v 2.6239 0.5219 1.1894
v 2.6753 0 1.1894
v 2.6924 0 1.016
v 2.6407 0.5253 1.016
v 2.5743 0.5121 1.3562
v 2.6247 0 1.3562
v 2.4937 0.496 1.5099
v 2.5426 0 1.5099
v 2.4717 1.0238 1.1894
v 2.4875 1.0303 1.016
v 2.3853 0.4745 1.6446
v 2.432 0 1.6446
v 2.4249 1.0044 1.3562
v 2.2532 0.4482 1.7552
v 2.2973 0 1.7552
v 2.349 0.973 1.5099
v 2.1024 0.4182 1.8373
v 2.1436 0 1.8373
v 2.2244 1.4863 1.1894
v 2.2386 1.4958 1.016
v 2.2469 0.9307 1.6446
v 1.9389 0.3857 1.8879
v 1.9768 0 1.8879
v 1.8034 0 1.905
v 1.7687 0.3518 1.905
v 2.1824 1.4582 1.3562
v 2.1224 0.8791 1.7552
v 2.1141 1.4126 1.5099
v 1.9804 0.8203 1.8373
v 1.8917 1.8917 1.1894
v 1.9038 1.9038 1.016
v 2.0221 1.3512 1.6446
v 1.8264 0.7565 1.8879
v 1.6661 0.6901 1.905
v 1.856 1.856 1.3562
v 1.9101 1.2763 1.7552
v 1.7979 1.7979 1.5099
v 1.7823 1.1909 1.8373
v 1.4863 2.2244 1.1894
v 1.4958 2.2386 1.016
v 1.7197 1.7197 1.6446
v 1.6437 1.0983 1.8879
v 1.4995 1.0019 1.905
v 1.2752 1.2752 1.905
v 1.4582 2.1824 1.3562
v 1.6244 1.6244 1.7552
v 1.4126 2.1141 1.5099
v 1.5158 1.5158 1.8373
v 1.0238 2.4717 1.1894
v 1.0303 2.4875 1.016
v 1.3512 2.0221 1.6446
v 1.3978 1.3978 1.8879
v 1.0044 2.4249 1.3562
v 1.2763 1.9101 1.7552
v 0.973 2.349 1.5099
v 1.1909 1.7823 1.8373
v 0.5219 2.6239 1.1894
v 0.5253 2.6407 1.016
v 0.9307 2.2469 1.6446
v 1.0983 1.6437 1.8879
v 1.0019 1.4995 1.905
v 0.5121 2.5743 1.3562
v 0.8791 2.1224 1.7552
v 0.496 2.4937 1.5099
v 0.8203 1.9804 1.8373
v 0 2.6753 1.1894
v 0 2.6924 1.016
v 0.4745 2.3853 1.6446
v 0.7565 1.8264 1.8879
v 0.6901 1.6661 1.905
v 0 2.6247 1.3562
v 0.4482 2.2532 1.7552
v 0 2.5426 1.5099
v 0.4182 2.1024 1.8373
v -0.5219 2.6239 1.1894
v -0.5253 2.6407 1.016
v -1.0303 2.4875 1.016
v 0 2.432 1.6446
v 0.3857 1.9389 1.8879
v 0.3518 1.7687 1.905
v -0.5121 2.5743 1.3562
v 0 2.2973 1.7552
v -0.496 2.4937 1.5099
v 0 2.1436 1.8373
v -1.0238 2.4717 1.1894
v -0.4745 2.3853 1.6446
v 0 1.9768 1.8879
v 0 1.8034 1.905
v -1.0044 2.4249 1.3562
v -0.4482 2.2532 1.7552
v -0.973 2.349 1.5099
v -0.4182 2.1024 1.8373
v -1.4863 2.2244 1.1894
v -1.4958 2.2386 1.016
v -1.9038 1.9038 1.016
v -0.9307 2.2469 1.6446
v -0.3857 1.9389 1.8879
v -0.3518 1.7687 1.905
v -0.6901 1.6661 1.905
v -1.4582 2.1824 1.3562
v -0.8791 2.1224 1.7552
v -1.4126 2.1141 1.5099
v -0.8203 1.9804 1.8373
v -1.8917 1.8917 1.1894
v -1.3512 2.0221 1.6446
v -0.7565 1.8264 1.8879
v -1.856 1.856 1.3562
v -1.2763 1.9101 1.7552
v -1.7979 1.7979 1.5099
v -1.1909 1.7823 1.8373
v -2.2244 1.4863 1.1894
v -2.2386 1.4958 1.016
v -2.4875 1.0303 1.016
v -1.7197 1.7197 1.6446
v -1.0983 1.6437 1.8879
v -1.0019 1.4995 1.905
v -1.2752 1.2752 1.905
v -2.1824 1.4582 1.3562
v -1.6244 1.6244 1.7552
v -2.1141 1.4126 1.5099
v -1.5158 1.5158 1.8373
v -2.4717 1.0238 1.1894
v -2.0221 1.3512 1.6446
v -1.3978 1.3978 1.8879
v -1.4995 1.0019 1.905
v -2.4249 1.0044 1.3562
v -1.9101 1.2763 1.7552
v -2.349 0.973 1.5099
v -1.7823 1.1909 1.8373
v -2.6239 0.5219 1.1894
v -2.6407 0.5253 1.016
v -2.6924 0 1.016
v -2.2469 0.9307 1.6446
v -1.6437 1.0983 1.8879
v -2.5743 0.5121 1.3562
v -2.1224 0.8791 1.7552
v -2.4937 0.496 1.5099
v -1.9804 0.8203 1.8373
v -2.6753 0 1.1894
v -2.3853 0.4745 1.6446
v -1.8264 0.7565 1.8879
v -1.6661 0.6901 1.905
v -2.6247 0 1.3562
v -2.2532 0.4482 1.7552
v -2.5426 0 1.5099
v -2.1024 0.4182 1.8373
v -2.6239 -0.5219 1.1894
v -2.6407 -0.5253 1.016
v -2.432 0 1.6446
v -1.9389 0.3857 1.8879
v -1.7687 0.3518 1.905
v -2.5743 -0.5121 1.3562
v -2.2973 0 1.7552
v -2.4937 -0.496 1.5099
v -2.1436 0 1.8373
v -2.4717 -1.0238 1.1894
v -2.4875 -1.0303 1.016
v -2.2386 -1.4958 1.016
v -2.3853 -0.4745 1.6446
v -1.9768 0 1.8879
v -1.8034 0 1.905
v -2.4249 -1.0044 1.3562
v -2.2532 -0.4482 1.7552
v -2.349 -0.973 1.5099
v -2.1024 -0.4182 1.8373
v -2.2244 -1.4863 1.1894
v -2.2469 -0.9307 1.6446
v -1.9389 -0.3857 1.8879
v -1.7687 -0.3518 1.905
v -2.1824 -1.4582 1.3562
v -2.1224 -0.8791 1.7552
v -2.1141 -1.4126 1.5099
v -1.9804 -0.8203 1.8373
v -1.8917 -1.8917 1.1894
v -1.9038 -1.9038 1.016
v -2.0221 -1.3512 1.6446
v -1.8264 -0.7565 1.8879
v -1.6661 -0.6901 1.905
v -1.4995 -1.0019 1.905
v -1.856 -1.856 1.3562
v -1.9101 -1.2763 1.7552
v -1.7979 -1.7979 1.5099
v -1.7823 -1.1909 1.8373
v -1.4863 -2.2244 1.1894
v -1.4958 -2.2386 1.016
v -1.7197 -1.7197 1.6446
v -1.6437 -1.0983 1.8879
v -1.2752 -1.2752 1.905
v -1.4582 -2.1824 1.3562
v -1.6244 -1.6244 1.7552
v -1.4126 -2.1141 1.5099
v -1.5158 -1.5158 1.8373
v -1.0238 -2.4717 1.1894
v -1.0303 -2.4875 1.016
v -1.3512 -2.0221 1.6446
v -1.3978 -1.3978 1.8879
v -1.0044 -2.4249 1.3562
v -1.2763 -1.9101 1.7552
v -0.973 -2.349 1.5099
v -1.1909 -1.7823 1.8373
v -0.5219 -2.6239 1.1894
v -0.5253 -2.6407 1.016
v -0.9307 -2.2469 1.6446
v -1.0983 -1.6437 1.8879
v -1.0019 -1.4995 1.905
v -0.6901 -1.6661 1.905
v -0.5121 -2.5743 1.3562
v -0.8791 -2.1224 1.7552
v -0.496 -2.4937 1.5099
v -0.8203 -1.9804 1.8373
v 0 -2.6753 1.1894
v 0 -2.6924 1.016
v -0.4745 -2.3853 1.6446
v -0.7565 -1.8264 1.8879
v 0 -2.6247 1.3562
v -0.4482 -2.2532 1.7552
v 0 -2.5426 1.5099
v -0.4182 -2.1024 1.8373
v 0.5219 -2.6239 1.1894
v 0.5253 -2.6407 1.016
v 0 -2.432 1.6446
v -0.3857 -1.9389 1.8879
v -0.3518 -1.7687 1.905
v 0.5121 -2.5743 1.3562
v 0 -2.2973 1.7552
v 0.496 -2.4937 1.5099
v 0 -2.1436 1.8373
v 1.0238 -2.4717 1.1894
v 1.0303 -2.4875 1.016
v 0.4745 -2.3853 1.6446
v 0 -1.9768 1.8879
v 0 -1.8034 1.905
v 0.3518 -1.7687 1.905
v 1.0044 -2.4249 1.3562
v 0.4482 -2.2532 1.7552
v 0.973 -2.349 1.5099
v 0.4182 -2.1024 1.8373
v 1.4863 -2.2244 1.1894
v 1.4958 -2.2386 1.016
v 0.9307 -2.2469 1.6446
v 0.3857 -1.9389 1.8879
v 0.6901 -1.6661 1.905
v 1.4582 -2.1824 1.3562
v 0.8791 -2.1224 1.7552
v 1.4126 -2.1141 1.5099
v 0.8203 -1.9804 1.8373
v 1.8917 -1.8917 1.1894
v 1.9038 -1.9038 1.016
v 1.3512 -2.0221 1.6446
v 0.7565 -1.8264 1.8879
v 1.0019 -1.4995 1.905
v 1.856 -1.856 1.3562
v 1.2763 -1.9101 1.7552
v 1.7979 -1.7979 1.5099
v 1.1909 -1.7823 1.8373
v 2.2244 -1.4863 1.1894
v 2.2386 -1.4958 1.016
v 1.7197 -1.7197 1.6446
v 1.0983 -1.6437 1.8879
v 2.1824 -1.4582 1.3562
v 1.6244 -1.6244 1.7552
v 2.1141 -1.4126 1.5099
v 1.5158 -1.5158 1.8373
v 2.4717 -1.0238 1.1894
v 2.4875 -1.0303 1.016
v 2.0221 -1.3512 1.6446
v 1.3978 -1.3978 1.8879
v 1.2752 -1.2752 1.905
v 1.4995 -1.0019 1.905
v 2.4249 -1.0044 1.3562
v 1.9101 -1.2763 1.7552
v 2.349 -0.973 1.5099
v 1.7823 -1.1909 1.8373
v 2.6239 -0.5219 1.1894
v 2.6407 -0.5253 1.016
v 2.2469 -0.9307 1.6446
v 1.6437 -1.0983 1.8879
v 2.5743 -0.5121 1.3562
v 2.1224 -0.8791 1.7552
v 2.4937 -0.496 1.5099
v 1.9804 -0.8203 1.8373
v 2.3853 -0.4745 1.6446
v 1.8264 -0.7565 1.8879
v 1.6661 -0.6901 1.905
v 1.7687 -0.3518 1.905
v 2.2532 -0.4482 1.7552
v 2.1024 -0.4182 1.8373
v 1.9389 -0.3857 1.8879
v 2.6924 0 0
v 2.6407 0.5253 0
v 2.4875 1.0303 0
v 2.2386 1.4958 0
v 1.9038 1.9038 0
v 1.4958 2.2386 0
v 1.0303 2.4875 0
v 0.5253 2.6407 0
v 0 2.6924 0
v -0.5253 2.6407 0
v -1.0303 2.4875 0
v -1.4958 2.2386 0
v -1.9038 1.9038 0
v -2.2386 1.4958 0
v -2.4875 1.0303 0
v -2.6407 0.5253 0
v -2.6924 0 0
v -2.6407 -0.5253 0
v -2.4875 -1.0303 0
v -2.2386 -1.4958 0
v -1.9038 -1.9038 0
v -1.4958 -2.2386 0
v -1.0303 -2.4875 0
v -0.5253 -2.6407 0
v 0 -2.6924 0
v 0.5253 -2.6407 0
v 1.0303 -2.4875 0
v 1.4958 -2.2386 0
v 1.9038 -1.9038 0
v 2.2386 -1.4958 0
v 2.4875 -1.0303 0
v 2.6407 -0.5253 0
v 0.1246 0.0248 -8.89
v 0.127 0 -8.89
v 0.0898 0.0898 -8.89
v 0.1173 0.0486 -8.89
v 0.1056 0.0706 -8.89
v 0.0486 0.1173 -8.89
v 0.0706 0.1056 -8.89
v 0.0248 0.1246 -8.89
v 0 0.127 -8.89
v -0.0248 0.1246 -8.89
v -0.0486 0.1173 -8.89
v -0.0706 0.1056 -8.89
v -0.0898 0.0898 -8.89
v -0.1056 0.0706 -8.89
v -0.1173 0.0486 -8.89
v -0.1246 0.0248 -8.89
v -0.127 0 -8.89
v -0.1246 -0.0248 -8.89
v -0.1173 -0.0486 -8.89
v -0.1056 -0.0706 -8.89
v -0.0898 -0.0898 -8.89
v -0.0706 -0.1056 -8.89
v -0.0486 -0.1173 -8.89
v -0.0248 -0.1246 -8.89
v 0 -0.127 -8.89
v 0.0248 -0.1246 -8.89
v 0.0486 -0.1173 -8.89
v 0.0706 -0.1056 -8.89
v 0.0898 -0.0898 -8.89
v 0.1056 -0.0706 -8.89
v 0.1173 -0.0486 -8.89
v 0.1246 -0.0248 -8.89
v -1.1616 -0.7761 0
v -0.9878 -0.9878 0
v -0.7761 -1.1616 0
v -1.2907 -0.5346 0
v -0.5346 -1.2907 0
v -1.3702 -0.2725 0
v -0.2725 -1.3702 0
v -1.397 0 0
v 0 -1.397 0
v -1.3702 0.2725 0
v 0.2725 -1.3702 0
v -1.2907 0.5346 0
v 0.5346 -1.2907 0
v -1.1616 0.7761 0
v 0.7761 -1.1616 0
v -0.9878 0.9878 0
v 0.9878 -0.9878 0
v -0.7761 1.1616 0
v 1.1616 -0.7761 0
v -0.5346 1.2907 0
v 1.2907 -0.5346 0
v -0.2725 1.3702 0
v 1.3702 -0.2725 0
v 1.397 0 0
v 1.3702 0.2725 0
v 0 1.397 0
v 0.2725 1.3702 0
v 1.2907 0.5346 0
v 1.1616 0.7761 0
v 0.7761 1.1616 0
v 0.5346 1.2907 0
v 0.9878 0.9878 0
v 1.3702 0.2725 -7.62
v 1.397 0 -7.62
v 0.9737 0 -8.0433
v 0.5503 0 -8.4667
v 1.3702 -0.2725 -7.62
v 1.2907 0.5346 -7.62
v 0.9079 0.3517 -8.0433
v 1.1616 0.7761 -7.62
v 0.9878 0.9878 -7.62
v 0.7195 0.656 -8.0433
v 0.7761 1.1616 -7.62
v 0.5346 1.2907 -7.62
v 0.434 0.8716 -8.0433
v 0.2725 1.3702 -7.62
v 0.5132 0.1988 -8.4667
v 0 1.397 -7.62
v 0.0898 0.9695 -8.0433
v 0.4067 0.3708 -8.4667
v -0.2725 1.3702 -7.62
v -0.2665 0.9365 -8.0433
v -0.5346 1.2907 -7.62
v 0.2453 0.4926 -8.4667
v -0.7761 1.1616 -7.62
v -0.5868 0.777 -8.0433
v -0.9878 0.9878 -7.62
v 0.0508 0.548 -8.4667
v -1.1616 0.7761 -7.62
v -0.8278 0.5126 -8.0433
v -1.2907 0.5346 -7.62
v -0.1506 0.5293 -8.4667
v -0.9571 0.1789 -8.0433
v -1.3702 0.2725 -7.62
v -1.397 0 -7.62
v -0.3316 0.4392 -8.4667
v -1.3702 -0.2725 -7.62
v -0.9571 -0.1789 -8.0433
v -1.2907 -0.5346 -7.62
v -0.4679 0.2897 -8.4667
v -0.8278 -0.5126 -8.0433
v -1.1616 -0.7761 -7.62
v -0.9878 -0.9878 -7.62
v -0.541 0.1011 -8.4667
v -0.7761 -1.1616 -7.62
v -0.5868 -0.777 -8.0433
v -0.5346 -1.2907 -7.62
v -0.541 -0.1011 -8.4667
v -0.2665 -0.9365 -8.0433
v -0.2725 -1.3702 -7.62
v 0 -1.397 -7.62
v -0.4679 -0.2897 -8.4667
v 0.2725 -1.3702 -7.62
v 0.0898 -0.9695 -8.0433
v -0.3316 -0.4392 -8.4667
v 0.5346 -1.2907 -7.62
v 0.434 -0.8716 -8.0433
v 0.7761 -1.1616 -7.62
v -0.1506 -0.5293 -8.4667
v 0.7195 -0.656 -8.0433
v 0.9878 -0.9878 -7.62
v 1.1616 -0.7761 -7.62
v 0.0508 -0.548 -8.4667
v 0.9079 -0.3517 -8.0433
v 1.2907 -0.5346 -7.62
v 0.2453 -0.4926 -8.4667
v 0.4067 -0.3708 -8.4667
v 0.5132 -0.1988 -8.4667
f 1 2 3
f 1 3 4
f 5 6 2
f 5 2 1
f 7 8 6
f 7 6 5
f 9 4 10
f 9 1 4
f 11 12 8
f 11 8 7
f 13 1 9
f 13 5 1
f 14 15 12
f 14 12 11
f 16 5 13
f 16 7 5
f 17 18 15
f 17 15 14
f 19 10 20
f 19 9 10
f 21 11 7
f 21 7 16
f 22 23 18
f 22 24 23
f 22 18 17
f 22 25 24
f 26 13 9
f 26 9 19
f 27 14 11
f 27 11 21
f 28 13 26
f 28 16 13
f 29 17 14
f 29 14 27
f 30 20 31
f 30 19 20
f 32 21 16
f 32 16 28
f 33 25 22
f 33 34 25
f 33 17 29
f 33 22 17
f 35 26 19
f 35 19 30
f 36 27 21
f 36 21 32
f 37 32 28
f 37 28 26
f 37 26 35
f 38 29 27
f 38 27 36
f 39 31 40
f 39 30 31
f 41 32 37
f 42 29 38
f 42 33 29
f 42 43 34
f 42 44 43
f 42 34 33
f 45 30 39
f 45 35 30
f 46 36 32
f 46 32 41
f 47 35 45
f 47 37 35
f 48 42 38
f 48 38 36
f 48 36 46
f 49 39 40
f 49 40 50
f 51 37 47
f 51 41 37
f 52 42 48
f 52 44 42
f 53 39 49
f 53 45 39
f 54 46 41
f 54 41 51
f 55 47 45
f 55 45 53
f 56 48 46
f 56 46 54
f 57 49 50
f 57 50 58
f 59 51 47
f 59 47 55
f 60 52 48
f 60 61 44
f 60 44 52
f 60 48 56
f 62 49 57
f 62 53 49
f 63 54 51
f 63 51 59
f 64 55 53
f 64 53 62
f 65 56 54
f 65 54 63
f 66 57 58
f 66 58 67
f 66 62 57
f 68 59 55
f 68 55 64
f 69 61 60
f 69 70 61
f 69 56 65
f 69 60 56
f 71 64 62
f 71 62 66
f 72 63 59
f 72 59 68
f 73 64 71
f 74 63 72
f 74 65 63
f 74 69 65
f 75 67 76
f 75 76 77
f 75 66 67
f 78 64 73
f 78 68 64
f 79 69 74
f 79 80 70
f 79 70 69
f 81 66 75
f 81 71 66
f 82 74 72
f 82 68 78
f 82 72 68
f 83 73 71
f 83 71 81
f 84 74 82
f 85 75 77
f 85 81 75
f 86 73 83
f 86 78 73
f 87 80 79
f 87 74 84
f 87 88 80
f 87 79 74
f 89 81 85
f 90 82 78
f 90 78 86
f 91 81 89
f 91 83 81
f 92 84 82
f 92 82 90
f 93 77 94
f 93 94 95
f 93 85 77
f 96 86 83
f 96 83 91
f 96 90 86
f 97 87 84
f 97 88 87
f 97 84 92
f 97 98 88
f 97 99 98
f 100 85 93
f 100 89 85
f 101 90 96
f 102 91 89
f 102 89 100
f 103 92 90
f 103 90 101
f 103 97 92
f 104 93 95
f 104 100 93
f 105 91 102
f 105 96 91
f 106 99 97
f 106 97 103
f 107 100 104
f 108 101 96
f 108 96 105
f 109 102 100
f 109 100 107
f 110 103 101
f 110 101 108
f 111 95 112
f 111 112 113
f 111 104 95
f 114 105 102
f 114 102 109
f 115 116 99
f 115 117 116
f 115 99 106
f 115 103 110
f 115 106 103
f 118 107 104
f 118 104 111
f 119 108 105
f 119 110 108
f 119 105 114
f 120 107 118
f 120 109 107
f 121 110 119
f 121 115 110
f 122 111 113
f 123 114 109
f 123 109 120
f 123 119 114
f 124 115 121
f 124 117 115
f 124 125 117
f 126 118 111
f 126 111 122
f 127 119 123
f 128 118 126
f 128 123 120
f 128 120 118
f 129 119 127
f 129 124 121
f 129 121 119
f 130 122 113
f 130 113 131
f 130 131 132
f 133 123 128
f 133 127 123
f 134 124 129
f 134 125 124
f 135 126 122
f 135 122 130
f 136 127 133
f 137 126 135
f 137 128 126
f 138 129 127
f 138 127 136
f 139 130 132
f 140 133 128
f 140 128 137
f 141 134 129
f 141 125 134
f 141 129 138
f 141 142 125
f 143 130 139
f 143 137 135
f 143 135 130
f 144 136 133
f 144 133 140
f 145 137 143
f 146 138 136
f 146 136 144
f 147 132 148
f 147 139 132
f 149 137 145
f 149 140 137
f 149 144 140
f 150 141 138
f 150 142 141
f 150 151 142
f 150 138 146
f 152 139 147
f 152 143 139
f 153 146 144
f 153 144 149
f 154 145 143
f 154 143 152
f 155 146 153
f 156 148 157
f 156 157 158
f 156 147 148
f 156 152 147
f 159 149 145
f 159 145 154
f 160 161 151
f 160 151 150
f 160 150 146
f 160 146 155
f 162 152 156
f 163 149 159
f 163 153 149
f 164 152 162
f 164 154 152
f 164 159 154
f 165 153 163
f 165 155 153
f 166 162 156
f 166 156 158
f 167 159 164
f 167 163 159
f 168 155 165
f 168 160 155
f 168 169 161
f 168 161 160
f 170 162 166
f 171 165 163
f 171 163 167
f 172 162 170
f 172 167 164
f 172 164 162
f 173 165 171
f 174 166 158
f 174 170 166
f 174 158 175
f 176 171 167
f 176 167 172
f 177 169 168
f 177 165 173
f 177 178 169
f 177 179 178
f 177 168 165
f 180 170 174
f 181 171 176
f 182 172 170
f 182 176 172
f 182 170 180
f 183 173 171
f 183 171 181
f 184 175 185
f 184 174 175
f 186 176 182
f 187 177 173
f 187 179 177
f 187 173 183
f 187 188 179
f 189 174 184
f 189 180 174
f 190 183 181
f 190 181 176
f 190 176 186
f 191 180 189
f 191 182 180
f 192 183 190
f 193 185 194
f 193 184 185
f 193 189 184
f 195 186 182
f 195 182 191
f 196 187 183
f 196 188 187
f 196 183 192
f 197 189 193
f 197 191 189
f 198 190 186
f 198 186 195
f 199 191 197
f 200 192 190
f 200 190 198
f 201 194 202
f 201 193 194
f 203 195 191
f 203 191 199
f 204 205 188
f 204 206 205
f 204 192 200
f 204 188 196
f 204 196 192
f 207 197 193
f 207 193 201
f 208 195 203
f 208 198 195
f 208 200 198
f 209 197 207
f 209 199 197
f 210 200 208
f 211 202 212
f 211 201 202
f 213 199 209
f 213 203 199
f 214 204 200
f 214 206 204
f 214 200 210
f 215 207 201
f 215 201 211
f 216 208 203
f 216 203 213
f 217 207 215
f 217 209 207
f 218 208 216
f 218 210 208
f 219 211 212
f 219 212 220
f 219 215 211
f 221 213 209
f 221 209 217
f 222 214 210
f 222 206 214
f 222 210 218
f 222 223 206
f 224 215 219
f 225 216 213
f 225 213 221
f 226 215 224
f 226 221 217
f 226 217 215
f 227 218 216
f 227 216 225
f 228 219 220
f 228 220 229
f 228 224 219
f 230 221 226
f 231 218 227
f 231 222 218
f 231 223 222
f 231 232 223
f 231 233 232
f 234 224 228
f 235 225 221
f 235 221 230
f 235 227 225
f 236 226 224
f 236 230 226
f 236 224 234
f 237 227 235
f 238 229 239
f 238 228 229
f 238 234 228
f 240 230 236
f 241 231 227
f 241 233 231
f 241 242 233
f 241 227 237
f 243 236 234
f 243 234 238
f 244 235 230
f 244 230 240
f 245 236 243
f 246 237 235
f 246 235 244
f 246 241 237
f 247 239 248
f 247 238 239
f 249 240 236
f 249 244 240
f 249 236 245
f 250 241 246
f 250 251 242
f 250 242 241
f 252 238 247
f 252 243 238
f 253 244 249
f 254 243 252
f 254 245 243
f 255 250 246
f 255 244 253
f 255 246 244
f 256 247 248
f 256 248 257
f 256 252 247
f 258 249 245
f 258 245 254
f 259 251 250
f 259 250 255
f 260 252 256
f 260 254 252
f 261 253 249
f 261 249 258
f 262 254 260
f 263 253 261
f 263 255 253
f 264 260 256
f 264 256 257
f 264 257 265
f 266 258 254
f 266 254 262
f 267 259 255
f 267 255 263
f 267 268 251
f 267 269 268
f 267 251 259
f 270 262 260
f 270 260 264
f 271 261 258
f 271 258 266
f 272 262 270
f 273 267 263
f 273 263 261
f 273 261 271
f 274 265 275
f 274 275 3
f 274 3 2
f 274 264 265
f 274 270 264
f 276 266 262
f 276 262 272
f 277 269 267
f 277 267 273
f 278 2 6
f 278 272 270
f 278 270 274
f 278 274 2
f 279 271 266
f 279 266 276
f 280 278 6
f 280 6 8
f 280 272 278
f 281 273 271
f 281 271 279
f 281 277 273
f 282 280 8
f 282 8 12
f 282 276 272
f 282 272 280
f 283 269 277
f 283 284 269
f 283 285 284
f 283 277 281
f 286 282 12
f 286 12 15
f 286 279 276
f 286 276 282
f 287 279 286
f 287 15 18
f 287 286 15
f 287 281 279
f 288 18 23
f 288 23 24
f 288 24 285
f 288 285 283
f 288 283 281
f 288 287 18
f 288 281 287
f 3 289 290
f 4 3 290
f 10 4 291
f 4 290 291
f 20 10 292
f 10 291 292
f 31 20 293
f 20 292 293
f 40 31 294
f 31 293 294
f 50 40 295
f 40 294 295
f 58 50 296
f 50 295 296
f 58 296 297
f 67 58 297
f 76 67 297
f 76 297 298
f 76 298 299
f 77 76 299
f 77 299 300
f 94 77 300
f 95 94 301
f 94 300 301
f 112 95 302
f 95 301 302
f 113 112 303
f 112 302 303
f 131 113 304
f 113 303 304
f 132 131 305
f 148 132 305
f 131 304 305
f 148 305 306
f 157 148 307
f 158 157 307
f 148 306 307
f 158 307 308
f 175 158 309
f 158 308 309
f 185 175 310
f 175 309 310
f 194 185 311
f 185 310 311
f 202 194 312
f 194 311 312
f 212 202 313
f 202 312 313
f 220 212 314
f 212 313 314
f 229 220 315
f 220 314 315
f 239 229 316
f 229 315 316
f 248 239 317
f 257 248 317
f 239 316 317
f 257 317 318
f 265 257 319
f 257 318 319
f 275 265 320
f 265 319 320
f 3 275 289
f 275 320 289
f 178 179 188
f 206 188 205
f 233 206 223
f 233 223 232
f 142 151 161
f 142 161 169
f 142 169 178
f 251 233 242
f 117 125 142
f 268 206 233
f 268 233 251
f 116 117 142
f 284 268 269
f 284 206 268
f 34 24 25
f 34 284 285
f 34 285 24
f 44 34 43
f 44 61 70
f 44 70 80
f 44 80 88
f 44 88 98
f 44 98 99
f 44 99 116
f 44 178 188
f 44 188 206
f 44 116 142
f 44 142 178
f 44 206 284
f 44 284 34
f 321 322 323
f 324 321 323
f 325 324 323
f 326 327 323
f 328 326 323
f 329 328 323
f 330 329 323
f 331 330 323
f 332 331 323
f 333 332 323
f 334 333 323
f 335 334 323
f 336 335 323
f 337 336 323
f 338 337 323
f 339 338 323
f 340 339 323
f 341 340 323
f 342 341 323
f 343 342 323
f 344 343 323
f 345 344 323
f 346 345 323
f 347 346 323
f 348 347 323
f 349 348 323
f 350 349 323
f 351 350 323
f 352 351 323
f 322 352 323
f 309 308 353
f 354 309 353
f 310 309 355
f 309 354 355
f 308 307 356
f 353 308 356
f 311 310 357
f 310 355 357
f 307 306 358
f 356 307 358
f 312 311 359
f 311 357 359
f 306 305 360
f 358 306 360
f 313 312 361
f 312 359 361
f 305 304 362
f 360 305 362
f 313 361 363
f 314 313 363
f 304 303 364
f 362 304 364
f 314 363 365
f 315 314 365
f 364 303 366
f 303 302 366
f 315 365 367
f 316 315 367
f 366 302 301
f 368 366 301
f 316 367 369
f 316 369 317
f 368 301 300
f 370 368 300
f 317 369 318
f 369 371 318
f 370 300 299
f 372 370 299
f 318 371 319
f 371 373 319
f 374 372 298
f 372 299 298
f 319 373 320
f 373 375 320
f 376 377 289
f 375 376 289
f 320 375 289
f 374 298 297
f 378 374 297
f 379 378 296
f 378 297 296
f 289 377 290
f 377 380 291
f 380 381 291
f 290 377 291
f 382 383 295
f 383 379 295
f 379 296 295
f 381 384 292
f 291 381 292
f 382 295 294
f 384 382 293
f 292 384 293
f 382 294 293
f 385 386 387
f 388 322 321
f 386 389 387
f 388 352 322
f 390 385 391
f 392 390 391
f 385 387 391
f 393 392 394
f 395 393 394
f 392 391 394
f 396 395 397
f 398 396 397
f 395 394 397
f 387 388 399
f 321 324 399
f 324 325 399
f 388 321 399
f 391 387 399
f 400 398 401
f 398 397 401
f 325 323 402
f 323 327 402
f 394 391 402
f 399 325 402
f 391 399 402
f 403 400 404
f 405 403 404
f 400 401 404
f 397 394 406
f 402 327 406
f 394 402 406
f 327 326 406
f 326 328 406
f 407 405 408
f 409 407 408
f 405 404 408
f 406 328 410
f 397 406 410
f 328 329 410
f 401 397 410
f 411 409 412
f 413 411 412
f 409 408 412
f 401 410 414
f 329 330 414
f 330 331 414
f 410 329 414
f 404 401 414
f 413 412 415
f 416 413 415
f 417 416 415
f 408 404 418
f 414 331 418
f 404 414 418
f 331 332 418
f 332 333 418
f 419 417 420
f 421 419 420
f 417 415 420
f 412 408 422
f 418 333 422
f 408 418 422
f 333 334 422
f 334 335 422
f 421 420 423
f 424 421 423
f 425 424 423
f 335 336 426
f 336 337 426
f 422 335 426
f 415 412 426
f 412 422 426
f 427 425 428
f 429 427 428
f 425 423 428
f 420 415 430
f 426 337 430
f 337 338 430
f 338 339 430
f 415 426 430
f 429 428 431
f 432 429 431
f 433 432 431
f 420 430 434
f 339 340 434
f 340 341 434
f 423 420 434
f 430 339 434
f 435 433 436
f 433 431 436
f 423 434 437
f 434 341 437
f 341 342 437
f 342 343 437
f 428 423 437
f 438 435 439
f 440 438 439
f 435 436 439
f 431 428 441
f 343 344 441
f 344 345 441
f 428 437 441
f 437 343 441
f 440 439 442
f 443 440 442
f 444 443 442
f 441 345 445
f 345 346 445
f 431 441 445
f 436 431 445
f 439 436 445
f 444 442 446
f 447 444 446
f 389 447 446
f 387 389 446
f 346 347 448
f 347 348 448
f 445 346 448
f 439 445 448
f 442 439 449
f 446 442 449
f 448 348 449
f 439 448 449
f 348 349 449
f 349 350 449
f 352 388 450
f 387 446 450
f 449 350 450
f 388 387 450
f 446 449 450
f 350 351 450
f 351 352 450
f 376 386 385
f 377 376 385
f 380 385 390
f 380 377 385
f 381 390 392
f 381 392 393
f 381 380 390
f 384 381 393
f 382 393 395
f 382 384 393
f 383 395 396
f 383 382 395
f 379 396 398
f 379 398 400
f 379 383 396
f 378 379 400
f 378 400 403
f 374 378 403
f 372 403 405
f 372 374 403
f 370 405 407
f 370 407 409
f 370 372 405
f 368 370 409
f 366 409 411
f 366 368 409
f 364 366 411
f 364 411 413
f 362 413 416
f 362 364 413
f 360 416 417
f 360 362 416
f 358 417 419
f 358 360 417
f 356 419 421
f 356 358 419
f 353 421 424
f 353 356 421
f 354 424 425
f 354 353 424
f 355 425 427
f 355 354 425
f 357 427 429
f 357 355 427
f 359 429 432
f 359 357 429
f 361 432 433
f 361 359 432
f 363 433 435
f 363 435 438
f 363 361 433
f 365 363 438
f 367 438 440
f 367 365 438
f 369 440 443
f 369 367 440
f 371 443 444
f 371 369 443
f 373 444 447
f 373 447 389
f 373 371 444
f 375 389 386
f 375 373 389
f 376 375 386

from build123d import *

# Parameters (mm, degrees)
F0_R     = 2.6924
F1_DEPTH = 1.905
F2_R     = 0.889
F3_R     = 1.397
F4_DEPTH = 8.89
F5_SIZE  = 1.27


with BuildPart() as f1:
    # F0 (on Top) → F1 (new body)
    with BuildSketch(Plane.XY):
        Circle(F0_R)
    extrude(amount=F1_DEPTH)

    # F2
    f2_edges = [f1.edges().sort_by_distance(p)[0] for p in [
        (-2.6924, 0, 1.905),
    ]]
    fillet(f2_edges, radius=F2_R)

    # F3 (on Top) → F4 (join)
    with BuildSketch(Plane.XY):
        Circle(F3_R)
    extrude(amount=-F4_DEPTH)

    # F5
    f5_edges = [f1.edges().sort_by_distance(p)[0] for p in [
        (-1.397, 0, -8.89),
    ]]
    chamfer(f5_edges, length=F5_SIZE)


solid = f1.part
